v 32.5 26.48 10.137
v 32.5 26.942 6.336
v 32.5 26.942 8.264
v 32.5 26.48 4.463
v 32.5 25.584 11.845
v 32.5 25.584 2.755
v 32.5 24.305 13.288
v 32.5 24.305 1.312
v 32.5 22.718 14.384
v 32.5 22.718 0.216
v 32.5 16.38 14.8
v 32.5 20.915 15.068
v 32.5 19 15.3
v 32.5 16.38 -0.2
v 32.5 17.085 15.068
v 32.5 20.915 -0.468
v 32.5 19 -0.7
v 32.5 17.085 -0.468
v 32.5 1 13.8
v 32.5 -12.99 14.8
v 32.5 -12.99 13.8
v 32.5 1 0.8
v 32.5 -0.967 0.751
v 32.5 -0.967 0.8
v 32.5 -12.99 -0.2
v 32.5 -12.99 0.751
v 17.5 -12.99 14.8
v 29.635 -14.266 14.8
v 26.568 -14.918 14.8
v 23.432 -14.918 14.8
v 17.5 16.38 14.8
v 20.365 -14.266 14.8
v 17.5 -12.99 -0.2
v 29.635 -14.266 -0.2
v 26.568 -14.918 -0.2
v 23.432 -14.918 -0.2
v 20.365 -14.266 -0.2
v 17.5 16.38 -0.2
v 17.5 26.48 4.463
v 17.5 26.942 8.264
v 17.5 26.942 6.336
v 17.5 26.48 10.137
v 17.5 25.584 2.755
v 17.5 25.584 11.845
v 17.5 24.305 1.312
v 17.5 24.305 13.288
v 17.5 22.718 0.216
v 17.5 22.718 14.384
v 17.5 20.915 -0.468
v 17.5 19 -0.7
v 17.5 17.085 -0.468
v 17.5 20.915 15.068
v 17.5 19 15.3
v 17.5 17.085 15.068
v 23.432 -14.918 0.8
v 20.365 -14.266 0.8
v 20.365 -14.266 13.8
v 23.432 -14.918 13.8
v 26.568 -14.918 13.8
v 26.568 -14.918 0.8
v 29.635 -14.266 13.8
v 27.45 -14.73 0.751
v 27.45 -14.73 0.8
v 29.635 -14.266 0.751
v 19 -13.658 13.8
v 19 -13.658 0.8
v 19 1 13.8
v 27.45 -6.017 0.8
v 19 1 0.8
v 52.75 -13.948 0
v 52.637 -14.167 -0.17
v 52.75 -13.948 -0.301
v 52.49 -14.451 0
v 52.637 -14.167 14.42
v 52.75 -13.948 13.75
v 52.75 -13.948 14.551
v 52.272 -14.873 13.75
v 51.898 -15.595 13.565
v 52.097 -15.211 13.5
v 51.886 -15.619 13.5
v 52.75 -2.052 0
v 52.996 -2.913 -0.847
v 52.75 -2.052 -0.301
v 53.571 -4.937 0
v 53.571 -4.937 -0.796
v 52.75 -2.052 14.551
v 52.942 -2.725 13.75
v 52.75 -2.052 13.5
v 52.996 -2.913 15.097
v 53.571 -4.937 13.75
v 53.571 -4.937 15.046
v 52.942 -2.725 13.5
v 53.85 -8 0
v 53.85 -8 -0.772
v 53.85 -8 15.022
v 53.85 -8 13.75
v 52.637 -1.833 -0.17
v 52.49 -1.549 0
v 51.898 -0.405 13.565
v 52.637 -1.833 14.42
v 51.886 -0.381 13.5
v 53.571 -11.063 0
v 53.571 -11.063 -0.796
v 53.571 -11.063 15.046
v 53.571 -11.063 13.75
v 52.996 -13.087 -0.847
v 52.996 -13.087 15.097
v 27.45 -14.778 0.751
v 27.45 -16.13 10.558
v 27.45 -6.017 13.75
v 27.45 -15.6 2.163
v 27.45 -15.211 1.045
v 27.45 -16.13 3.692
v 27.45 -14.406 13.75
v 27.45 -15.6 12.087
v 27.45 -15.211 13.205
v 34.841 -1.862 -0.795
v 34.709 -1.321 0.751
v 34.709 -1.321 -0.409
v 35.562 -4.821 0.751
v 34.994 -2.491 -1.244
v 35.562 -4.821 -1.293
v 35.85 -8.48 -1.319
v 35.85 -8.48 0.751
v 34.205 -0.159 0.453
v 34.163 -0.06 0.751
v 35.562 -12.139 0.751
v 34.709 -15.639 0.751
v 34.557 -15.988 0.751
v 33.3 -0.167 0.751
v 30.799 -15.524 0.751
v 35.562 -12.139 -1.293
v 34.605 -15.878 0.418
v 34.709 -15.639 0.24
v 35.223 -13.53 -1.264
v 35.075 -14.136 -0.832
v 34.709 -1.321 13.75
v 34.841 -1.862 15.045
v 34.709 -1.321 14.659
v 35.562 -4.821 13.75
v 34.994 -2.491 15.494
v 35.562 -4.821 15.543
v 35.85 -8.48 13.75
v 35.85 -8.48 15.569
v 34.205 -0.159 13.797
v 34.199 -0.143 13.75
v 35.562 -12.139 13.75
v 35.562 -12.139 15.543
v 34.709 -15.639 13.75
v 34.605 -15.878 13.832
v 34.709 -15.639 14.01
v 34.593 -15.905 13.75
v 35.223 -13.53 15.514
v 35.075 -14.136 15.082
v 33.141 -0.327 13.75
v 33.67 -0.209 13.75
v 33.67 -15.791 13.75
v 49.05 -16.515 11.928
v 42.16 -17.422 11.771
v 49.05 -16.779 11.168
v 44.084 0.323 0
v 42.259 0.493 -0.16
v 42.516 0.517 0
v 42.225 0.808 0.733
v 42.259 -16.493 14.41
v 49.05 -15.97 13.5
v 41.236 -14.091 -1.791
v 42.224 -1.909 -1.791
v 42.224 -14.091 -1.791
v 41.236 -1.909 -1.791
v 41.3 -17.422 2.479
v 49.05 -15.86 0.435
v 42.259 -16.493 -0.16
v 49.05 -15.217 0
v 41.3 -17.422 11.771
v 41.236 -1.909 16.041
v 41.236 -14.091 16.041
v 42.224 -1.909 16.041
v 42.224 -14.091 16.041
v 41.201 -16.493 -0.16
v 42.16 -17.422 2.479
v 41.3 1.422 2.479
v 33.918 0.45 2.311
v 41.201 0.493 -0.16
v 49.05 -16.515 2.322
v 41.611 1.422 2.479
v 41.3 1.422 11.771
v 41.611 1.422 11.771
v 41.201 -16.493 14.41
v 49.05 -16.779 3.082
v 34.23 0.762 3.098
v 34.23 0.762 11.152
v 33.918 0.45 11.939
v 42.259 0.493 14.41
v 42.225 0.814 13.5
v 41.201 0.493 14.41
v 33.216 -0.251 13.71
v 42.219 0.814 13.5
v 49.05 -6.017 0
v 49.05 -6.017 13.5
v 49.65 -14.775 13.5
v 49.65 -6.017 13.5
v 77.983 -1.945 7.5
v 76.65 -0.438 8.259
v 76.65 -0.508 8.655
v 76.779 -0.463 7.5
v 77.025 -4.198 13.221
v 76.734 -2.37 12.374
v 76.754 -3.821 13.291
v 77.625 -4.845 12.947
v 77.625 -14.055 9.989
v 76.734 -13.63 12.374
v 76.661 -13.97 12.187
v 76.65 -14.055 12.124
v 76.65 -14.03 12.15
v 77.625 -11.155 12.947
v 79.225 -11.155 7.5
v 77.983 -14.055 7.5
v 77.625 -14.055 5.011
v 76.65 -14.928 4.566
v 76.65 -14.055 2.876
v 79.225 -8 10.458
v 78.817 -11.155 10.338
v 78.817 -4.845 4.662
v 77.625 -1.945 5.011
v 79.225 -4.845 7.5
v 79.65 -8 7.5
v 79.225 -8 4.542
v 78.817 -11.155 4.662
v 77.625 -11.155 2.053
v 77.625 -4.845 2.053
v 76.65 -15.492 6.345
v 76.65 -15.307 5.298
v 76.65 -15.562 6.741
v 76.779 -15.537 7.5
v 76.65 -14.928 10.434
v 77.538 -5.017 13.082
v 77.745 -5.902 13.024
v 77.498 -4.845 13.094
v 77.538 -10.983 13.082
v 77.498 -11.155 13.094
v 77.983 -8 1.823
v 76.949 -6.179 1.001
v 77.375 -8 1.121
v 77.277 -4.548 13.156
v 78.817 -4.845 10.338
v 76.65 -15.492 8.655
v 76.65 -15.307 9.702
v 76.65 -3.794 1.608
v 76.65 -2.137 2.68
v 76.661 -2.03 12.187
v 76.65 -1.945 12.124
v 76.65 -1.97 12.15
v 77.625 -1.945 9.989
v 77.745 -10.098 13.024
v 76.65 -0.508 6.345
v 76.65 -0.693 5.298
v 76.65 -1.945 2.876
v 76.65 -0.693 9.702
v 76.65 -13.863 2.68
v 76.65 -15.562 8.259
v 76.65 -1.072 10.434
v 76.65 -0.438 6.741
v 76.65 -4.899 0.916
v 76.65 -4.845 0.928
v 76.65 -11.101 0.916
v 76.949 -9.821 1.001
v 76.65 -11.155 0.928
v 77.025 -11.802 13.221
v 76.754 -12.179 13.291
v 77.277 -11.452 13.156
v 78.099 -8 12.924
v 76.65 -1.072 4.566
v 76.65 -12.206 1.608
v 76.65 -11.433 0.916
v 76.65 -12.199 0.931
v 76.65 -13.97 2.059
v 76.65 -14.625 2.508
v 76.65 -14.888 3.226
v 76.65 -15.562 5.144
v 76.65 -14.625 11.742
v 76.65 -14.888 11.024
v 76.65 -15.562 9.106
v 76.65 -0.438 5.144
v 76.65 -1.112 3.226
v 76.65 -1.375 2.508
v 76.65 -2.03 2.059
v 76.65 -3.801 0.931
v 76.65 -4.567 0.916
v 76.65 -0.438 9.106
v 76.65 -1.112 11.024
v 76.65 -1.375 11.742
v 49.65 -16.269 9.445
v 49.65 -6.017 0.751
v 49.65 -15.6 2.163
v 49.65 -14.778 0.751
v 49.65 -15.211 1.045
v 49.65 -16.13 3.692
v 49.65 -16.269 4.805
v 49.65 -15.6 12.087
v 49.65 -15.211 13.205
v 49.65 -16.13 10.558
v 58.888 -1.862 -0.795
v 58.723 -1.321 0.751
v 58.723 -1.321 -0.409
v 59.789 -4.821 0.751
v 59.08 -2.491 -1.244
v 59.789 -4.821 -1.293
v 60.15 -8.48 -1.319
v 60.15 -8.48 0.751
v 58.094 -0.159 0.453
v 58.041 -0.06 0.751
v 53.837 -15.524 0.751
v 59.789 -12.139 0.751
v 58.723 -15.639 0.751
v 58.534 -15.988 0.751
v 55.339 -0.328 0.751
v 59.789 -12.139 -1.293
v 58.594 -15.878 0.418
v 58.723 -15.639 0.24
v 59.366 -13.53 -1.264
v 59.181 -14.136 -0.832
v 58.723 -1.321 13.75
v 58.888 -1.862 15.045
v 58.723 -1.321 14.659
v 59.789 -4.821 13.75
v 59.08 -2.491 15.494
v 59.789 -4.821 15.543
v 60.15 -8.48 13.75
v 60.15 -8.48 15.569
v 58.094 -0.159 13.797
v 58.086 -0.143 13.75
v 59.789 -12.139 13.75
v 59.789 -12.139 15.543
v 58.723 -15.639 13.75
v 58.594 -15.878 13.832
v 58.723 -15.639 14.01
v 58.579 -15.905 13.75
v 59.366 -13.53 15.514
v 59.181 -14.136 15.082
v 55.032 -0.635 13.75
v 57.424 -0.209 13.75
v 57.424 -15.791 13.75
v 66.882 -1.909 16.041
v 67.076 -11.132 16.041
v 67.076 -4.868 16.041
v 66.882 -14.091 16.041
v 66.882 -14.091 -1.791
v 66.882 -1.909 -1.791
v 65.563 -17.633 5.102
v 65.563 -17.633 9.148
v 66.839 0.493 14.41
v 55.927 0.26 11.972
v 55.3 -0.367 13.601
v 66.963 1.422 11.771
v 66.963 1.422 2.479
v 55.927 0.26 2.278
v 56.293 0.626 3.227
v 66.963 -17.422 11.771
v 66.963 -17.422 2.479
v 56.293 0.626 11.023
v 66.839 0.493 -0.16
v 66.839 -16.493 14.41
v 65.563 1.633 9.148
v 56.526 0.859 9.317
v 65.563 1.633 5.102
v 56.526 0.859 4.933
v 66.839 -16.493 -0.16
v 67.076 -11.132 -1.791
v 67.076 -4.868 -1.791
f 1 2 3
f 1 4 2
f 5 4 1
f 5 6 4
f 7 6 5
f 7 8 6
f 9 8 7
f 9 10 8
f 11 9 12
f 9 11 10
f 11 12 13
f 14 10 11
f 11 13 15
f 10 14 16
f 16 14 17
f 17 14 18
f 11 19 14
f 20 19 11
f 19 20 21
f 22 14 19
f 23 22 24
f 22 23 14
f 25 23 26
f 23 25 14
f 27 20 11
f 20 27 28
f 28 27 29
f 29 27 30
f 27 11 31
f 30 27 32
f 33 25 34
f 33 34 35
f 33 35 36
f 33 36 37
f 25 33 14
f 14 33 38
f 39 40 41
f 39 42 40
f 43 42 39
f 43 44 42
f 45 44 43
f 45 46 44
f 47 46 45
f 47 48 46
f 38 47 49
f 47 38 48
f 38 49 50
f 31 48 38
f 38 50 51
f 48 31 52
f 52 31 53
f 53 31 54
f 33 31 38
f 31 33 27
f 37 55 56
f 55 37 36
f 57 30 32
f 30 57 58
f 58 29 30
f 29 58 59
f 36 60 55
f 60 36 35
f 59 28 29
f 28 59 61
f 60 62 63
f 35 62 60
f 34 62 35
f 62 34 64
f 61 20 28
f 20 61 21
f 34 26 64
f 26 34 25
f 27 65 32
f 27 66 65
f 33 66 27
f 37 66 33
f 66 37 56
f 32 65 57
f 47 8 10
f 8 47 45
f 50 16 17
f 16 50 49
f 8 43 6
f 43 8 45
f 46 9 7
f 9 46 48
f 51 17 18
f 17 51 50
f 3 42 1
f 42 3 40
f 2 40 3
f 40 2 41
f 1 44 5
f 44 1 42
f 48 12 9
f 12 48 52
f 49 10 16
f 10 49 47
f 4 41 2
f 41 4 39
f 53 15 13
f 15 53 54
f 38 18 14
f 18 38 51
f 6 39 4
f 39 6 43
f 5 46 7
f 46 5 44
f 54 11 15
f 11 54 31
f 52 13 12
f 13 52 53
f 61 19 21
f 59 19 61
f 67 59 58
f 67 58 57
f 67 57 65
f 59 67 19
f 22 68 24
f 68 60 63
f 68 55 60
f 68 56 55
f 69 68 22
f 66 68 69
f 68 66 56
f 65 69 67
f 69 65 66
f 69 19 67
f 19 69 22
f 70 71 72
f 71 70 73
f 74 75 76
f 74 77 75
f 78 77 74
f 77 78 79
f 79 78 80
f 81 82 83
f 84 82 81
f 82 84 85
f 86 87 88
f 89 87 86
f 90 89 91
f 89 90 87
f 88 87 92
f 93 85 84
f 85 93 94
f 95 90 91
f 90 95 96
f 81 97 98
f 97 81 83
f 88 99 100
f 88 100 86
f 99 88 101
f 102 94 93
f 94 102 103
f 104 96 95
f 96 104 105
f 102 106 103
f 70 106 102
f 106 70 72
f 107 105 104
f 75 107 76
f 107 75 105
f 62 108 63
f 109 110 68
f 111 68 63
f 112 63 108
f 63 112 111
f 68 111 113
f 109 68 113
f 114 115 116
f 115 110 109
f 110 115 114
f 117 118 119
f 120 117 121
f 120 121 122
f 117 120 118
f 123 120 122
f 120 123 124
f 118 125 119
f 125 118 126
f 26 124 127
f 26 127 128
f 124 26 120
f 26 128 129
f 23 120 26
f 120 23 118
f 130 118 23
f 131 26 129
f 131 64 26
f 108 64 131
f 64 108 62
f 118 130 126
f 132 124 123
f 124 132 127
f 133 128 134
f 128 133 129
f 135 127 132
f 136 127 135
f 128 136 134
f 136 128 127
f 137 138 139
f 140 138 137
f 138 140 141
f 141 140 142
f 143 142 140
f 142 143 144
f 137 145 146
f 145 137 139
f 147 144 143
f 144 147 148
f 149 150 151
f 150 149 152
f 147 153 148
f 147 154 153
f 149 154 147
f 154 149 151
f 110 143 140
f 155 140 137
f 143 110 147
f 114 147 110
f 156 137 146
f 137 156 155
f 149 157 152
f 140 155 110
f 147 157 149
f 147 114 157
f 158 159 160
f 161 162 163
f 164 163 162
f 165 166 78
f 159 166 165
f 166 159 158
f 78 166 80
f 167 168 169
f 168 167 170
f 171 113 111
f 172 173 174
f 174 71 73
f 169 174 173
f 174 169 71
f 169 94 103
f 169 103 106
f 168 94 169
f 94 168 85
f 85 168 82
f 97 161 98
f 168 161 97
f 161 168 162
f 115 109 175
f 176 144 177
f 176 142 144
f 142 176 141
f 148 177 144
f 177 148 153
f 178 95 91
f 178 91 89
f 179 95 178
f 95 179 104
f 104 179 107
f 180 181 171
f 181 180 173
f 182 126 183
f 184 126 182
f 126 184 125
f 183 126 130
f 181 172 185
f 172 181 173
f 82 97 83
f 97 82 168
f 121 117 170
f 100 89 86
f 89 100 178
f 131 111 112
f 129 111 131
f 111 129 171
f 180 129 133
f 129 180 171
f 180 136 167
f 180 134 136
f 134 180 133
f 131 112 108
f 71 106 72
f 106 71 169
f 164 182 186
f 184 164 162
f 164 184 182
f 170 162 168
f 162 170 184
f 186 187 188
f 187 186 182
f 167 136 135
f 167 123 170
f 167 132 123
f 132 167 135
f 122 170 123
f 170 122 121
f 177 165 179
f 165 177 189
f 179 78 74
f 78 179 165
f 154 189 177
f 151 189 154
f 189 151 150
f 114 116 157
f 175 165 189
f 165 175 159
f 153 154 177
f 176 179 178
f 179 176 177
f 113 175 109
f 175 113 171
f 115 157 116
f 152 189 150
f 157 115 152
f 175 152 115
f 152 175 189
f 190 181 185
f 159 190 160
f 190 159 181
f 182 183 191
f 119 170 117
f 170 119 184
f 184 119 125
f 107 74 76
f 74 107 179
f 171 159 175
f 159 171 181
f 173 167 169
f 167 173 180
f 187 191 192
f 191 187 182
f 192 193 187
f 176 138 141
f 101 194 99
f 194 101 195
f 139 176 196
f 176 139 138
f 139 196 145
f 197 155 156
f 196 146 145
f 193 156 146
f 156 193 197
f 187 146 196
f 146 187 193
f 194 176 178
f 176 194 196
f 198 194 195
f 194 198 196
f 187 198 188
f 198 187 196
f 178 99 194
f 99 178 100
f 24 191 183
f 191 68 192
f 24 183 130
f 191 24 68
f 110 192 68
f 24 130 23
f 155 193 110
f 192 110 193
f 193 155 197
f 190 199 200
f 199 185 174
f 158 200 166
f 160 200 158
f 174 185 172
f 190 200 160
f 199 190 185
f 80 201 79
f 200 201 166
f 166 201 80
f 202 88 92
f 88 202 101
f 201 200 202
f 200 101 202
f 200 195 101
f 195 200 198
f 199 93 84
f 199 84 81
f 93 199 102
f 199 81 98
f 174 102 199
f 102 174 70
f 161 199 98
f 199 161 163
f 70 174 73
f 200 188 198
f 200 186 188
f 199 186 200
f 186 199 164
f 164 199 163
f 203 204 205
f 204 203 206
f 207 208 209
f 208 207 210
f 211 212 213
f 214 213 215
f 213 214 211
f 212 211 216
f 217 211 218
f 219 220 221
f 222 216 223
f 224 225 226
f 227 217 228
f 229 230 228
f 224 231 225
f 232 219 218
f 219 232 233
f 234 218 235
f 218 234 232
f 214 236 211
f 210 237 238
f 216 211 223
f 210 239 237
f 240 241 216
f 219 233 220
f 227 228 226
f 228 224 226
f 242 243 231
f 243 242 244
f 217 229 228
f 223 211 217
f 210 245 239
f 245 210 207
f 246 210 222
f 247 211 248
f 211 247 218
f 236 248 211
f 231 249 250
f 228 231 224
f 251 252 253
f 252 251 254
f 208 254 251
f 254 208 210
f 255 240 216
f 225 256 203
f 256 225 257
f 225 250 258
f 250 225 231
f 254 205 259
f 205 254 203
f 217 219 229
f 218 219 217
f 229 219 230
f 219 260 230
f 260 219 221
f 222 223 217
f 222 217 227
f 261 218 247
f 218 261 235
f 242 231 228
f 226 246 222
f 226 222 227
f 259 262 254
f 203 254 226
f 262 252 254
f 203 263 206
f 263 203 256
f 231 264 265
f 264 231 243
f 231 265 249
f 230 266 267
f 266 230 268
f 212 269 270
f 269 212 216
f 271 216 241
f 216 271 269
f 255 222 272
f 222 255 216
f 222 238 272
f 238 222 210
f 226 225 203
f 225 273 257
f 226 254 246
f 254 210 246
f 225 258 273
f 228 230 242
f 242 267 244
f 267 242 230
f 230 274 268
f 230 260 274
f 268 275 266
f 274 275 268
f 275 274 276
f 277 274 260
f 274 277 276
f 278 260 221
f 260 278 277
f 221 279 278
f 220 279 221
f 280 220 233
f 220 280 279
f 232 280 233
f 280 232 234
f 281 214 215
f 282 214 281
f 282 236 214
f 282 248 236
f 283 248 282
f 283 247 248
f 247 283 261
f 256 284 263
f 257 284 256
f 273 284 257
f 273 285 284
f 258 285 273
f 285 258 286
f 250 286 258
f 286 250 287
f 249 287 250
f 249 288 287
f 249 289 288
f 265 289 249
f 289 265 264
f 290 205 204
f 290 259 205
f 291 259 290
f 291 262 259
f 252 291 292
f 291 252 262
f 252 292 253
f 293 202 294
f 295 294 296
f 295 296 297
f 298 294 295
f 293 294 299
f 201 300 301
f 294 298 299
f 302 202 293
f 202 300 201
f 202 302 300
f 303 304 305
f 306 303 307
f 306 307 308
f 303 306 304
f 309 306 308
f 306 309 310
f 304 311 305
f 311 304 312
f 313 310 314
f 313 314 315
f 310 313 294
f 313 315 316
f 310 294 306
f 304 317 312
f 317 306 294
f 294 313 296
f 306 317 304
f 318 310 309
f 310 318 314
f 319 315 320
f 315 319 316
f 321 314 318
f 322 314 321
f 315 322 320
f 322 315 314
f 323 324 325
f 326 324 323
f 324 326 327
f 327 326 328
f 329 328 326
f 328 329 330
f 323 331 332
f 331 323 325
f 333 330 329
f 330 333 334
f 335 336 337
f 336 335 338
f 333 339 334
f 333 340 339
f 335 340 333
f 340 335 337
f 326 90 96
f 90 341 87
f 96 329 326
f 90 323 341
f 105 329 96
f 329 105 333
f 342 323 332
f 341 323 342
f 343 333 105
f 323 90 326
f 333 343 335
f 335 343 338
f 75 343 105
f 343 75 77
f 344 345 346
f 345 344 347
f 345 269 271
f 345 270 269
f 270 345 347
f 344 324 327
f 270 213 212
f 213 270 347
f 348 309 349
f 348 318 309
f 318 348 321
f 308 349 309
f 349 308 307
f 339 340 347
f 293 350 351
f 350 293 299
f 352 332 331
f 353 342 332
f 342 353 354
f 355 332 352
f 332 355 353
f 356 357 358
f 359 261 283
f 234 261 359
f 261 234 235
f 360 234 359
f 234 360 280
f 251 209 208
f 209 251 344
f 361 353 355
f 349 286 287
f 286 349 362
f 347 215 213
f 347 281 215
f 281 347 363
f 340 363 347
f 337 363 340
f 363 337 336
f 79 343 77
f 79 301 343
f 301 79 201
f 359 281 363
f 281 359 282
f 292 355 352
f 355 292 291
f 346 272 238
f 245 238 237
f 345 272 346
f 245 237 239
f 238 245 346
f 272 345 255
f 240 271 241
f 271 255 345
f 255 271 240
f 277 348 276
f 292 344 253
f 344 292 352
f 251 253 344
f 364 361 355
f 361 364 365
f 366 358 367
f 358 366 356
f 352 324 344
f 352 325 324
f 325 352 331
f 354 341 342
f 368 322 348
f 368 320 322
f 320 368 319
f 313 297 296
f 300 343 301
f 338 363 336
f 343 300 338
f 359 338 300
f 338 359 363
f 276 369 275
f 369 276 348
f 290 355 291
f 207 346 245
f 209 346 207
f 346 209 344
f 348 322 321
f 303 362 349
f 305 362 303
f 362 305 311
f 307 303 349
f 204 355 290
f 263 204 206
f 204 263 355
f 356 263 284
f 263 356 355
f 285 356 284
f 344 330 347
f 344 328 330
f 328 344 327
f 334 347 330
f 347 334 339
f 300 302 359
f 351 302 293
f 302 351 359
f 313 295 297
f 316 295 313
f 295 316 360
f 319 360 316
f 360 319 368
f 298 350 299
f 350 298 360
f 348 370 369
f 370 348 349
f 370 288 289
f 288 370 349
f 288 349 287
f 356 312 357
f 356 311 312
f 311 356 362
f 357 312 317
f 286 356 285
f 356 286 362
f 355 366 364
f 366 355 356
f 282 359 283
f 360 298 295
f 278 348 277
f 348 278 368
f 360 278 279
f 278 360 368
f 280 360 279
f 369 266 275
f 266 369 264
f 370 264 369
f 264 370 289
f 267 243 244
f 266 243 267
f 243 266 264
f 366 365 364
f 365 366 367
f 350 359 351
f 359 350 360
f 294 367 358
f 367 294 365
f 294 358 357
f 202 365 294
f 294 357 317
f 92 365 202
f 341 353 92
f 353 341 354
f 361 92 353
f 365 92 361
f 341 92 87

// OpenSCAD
// file: part/util/finger-tip.scad
module fingertip(length,x,y,z,padding,width)
{ 
	difference() {
		scale([y,x,z]) {
			intersection() {
                difference() {
                    union() {
                        translate([length-5,5,5]) sphere(r =7);
                        translate([0,-5,-5]) cube([length,width + 10,20]);
                    }
                    //cutout for the side
                        translate([-4,-width+0.001,5.3]) rotate([-90,0,0]) cylinder(r=11,h=10);
                        translate([-4,width - padding*(1/x),5.3]) rotate([-90,0,0]) cylinder(r=11,h=10);
                }
                hull() {
                    for(i=[-1,1], j=[-1,1]) {
                        //angled cylinders to provide the outer shape of the finger
                        translate([length/10,i*2.4 + width/2,j*2.2 + 5]) rotate([i*j*-4,j*86,0]) cylinder(d=6,h=20,center=true);
                        //tip part
                        translate([length-3, i + width/2, j*2.2 + 5])rotate([i*j*-4,j*-80,0]) cylinder(d=6,h=10,center=true);  
                    }
                }              
            } 
		}
        translate([0,padding/2 * x,0])              
        fingerbasecutout(width-padding,x,z);
	}
}

module fingerbasecutout(width,x,z) {
	translate([-13/z,0,0]) rotate([0,45,0]) translate([-50,0,0]) cube([100,width*x, 10]);
}

rotate([0,-90,0]) fingertip(20,1.5,1.5,1.6,0.5,9.5);
// file: part/util/finger-base.scad
module fingerbase(length,x,y,z,padding,width)
{ 
	difference() {
		scale([y,x,z]) {
			intersection() {
                difference() {
                    union() {
                        translate([length-4,-5,5]) rotate([-90,0,0]) cylinder(r=8,h=width + 10);
                        translate([0,-5,-5]) cube([length,width + 10,20]);
                    }
                    //cutout for the side
                        translate([-4,-width+0.001,5.3]) rotate([-90,0,0]) cylinder(r=11,h=10);
                        translate([-4,width - padding*(1/x),5.3]) rotate([-90,0,0]) cylinder(r=11,h=10);
                }
                
                hull() {
                    for(i=[-1,1], j=[-1,1]) {
                        //angled cylinders to provide the outer shape of the finger
                        translate([length/10,i*2.4 + width/2,j*2.2 + 5]) rotate([i*j*-4,j*86,0]) cylinder(d=6,h=20,center=true);
                        translate([length+4, i*2.4 + width/2, j*2.2 + 5]) rotate([i*j*-4,j*-86,0]) cylinder(d=6,h=20,center=true);
                    }
                }
            } 
		}
        translate([0,padding/2 * x,0])              
        fingerbasecutout(width-padding,x,z);
        translate([length * y,0,0]) 
        mirror([1,0,0])fingerbasecutout(width-padding,x,z);
	}
}

module fingerbasecutout(width,x,z) {
	//cubic parts
	translate([-100,0,0]) cube([100,width*x,100]);
	translate([-13/z,0,0]) rotate([0,45,0]) translate([-50,0,0]) cube([100,width*x, 10]);
}

//fingerbase(20,1.5,1.5,1.6,0.5,9.5);
fingerbase(20,1.5,1.5,1.6,0.5,9.5);
// file: part/finger-middle.scad
use <util/finger-base.scad>;
use <util/finger-tip.scad>;

module middlefinger(length,x,y,z,angle){
    difference(){
        union(){
            //base object
            fingerbase(length,x,y-0.3,z,0.5,9.5);
            
            //rotate object
            //starting point t=0
            translate([length*1.4,0,length*0.4])
            //rotate
            rotate([0,angle*$t,0])
            //rotate point in the object
            translate([-length/6,0,-length/2.5])
            fingertip(length,x,y,z,0.5,9.5);
        }
    }
}

middlefinger(20,1.5,1.5,1.6,50);
// main file
use <part/finger-middle.scad>;

module thumbbase(){
    translate([25,1,7.3])
    difference(){
        union(){
            translate([0,-6,0])
            intersection(){
                cube([15,45,16],center=true);
                translate([0,5,0])
                union(){
                    translate([0,20,0])
                    cube([15,15,15],center=true);
                    cylinder(h=15,r=15,center=true);
                }
            }
            translate([0,18,0])
            rotate([0,90,0])
            cylinder(h=15,r=8,center=true);
        }
        translate([1.5,-9,0])
        cube([15,18,13],center=true);
    }
}

module thumb(angle1,angle2){
    length=18;
    x=1.5;
    y=1.5;
    z=1.6;
    //base object
    thumbbase();
    //rotate object
    rotate([90,0,0])
    //starting point t=0
    translate([length*1.65,0,length*0.4])
    //rotate
    rotate([0,-angle1*$t,0])
    //rotate point in the object
    translate([-length/8,0,-length/2.5])
    middlefinger(length,x,y,z,angle2);
}

thumb(90,90);
